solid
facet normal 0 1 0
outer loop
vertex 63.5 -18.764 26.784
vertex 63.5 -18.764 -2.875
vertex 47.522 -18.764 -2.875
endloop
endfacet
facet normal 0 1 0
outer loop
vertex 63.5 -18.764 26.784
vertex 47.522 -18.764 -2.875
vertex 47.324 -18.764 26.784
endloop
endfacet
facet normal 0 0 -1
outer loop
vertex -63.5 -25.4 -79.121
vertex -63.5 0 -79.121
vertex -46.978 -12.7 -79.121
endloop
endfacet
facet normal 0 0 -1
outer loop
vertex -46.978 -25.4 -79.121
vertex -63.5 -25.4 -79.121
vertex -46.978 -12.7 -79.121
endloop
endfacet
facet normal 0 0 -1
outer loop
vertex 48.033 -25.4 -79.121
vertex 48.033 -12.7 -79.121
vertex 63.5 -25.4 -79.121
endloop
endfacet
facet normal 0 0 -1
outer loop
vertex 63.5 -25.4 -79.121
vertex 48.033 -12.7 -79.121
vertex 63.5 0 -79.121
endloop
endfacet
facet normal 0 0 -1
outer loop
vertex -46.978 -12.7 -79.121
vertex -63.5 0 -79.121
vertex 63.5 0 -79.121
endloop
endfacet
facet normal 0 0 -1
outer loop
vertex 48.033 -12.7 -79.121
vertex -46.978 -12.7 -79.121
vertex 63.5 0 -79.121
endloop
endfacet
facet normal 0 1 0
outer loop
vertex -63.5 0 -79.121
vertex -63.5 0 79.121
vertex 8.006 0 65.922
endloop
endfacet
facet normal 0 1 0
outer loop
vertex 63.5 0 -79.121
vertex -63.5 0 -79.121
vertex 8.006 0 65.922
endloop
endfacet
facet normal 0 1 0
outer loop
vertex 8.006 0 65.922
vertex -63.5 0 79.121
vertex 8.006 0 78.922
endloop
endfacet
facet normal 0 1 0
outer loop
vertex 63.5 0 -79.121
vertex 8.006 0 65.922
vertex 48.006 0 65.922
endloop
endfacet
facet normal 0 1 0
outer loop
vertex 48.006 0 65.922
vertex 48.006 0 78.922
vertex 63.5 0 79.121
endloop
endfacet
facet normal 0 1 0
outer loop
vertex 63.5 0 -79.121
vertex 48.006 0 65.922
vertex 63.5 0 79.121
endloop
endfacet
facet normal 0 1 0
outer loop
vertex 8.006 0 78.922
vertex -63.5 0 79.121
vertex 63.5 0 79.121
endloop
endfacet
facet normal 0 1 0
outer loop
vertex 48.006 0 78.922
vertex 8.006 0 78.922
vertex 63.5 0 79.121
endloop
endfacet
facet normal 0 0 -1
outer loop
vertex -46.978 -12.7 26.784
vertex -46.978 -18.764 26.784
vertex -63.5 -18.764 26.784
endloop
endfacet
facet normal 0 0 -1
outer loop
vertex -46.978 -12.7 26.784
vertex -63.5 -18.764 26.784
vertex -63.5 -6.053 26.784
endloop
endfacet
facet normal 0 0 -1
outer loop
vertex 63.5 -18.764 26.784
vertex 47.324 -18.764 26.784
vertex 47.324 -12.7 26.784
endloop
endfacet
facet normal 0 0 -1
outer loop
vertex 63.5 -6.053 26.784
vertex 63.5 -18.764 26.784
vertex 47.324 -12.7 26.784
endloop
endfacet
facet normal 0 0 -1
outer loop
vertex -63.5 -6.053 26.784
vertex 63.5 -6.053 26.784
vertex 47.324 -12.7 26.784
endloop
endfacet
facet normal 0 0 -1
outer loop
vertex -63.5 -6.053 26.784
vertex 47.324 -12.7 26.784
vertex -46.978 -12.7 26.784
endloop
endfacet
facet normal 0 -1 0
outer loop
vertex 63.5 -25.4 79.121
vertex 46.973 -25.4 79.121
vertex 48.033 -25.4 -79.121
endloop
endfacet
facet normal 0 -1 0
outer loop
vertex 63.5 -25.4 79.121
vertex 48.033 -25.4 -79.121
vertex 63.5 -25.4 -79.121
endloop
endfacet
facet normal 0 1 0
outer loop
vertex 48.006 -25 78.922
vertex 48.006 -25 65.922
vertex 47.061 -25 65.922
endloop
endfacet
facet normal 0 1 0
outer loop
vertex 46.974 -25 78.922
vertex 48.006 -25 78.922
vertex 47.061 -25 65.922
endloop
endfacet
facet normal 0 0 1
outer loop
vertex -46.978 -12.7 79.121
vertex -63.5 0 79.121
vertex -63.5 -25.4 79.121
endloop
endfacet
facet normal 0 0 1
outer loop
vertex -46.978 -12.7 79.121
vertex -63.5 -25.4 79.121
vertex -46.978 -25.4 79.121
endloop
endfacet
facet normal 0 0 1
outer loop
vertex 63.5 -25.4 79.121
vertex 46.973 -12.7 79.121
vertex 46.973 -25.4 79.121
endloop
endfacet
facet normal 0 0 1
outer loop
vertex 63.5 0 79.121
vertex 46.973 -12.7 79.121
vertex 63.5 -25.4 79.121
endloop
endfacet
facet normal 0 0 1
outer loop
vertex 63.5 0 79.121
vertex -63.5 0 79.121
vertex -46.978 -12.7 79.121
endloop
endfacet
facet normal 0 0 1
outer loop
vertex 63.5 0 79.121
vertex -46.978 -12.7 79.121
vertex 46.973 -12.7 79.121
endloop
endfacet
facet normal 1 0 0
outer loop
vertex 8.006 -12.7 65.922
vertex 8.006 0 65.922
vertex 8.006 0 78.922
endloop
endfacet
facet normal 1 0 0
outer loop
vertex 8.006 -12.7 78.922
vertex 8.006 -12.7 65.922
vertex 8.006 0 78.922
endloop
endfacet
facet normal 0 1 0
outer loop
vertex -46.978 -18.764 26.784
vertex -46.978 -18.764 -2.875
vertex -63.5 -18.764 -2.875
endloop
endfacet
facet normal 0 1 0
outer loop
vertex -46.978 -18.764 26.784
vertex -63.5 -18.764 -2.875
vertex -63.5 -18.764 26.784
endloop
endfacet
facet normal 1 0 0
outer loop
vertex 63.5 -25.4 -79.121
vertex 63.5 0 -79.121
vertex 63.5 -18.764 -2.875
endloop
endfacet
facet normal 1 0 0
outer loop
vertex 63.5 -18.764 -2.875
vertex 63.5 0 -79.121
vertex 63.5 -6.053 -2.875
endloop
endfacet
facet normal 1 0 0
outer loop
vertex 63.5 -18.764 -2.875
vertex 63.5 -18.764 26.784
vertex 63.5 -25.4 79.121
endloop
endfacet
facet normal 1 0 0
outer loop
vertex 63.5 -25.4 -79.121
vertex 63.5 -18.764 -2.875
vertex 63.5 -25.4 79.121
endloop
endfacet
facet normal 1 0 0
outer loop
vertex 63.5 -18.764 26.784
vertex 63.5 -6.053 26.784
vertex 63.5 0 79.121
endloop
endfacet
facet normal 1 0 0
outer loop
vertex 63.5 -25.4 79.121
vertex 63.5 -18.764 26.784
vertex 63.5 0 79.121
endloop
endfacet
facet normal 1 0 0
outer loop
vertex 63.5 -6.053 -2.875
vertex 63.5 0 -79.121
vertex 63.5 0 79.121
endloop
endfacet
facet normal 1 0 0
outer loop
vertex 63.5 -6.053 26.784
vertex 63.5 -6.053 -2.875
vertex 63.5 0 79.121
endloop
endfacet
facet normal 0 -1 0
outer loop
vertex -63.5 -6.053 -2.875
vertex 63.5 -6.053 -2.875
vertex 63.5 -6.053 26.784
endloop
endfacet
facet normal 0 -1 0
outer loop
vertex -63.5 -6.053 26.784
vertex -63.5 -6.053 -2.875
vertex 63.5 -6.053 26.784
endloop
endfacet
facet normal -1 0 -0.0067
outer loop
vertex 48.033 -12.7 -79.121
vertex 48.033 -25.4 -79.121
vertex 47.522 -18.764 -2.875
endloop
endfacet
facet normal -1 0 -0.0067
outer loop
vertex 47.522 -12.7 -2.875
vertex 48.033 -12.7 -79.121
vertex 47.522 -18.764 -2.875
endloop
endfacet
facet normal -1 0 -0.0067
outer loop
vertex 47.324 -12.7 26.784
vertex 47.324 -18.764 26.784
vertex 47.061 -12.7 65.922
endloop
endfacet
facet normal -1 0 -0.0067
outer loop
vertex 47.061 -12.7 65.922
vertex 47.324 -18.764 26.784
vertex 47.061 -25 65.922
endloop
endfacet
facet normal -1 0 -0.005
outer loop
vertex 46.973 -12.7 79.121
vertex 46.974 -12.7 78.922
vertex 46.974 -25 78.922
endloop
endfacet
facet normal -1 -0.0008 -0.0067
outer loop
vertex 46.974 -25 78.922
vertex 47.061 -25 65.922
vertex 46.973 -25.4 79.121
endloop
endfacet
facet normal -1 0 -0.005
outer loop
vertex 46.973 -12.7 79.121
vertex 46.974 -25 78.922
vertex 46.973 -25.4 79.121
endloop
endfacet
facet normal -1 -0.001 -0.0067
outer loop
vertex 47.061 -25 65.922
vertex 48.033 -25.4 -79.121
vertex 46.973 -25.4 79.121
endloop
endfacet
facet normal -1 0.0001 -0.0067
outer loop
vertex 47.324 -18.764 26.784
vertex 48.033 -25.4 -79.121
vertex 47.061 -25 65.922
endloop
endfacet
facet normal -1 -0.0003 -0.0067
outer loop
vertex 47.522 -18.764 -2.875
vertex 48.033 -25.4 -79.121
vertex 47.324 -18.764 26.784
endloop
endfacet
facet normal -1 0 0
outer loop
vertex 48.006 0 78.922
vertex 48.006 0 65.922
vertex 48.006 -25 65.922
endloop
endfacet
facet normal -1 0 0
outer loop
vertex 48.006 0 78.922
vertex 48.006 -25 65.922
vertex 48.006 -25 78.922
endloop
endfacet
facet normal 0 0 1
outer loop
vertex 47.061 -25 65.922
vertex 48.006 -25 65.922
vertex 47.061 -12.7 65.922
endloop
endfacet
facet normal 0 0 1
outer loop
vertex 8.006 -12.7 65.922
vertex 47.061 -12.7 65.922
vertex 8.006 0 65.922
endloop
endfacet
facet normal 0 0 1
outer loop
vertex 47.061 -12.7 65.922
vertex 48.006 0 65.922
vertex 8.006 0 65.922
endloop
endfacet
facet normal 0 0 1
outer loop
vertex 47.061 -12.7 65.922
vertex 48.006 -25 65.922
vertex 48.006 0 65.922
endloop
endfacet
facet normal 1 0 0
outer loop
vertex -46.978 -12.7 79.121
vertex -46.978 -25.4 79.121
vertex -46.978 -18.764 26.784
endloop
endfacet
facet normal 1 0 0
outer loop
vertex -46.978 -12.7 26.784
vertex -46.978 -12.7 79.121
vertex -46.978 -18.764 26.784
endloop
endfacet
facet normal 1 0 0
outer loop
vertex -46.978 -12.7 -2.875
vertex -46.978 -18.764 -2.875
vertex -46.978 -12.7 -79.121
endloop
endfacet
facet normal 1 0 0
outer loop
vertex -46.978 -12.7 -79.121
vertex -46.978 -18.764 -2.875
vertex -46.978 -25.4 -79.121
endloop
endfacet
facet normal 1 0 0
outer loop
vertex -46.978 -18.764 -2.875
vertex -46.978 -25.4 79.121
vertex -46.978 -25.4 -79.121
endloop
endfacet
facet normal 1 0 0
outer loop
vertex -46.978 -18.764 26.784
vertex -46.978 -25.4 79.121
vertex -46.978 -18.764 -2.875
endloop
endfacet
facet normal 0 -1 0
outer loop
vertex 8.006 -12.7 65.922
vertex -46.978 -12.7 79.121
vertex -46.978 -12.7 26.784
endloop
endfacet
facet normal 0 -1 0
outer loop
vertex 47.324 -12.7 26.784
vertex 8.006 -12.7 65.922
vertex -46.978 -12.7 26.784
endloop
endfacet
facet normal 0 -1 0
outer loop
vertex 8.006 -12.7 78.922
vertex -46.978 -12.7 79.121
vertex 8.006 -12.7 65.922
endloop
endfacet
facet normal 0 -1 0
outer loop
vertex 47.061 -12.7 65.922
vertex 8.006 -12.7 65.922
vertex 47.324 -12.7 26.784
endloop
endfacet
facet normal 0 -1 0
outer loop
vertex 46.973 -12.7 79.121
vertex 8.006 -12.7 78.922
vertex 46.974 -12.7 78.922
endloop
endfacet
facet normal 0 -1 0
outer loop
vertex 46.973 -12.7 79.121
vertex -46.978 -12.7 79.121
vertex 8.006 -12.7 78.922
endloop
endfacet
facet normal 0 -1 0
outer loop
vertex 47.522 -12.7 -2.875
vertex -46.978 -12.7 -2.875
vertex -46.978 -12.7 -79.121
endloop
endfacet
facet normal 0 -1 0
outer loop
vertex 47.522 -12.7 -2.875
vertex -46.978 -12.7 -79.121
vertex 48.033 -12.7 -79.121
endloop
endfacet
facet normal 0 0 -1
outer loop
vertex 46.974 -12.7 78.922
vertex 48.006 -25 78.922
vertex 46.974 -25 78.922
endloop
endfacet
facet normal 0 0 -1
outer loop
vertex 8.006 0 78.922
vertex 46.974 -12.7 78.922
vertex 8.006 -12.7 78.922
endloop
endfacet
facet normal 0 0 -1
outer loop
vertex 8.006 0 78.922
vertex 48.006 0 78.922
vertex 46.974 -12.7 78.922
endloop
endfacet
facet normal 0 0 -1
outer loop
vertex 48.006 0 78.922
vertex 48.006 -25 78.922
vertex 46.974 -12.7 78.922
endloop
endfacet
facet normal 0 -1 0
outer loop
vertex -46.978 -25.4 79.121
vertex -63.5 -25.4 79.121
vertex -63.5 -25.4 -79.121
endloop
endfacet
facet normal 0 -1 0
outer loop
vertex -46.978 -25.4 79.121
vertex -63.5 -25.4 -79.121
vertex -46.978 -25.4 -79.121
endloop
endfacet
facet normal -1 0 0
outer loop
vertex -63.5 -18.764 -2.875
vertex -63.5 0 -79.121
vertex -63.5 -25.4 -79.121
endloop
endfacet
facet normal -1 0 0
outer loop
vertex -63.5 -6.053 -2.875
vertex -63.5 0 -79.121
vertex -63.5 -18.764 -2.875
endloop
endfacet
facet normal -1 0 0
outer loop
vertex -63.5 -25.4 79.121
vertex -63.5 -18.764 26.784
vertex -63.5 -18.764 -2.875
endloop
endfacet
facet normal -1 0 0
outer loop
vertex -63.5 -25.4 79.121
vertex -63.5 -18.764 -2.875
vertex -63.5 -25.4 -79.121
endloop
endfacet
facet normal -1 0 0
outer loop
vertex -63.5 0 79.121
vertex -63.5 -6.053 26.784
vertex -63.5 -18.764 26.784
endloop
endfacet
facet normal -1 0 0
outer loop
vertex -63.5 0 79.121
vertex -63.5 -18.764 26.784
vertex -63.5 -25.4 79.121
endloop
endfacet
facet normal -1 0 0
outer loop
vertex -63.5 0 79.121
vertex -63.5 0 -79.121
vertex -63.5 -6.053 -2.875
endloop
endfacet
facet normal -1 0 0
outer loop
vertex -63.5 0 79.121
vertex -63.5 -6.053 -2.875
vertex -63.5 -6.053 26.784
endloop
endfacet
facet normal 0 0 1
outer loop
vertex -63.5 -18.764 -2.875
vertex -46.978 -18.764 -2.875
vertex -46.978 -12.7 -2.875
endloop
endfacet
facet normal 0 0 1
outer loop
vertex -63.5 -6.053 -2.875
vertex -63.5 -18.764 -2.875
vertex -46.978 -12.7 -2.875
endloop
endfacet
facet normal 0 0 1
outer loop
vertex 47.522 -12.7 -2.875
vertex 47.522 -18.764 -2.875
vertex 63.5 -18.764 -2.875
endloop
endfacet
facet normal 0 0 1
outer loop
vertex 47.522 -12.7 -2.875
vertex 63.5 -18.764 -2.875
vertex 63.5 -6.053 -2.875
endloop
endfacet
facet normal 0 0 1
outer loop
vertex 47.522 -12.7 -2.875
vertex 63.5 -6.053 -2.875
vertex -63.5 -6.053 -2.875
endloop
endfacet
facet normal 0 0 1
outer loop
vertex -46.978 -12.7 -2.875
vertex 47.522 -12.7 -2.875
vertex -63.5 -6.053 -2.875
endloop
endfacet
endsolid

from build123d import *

# Parameters (mm, degrees)
F0_W     = 127
F0_H     = 158.242
F1_DEPTH = 25.4
F4_DEPTH = 12.7
F5_W     = 40
F5_H     = 13
F6_DEPTH = 25
F7_W     = 12.711242
F7_H     = 29.659567
F8_DEPTH = 152.4


with BuildPart() as f1:
    # F0 (on Front) → F1 (new body)
    with BuildSketch(Plane.XZ):
        Rectangle(F0_W, F0_H)
    extrude(amount=F1_DEPTH)

    # F3 (on face) → F4 (cut)
    with BuildSketch(Plane.XZ.offset(25.4)):
        Polygon((48.082705, -86.58883), (46.892088, 91.21117), (-46.977836, 91.21117), (-46.977836, -86.58883), align=None)
    extrude(amount=-F4_DEPTH, mode=Mode.SUBTRACT)

    # F5 (on face) → F6 (cut)
    with BuildSketch(Plane(origin=(0, 0, 0), x_dir=(-1, 0, 0), z_dir=(0, 1, 0))):
        with Locations((-28.005632, 72.421707)):
            Rectangle(F5_W, F5_H)
    extrude(amount=-F6_DEPTH, mode=Mode.SUBTRACT)

    # F7 (on face) → F8 (cut)
    with BuildSketch(Plane.YZ.offset(63.5)):
        with Locations((-12.408594, 11.954622)):
            Rectangle(F7_W, F7_H)
    extrude(amount=-F8_DEPTH, mode=Mode.SUBTRACT)


solid = f1.part
